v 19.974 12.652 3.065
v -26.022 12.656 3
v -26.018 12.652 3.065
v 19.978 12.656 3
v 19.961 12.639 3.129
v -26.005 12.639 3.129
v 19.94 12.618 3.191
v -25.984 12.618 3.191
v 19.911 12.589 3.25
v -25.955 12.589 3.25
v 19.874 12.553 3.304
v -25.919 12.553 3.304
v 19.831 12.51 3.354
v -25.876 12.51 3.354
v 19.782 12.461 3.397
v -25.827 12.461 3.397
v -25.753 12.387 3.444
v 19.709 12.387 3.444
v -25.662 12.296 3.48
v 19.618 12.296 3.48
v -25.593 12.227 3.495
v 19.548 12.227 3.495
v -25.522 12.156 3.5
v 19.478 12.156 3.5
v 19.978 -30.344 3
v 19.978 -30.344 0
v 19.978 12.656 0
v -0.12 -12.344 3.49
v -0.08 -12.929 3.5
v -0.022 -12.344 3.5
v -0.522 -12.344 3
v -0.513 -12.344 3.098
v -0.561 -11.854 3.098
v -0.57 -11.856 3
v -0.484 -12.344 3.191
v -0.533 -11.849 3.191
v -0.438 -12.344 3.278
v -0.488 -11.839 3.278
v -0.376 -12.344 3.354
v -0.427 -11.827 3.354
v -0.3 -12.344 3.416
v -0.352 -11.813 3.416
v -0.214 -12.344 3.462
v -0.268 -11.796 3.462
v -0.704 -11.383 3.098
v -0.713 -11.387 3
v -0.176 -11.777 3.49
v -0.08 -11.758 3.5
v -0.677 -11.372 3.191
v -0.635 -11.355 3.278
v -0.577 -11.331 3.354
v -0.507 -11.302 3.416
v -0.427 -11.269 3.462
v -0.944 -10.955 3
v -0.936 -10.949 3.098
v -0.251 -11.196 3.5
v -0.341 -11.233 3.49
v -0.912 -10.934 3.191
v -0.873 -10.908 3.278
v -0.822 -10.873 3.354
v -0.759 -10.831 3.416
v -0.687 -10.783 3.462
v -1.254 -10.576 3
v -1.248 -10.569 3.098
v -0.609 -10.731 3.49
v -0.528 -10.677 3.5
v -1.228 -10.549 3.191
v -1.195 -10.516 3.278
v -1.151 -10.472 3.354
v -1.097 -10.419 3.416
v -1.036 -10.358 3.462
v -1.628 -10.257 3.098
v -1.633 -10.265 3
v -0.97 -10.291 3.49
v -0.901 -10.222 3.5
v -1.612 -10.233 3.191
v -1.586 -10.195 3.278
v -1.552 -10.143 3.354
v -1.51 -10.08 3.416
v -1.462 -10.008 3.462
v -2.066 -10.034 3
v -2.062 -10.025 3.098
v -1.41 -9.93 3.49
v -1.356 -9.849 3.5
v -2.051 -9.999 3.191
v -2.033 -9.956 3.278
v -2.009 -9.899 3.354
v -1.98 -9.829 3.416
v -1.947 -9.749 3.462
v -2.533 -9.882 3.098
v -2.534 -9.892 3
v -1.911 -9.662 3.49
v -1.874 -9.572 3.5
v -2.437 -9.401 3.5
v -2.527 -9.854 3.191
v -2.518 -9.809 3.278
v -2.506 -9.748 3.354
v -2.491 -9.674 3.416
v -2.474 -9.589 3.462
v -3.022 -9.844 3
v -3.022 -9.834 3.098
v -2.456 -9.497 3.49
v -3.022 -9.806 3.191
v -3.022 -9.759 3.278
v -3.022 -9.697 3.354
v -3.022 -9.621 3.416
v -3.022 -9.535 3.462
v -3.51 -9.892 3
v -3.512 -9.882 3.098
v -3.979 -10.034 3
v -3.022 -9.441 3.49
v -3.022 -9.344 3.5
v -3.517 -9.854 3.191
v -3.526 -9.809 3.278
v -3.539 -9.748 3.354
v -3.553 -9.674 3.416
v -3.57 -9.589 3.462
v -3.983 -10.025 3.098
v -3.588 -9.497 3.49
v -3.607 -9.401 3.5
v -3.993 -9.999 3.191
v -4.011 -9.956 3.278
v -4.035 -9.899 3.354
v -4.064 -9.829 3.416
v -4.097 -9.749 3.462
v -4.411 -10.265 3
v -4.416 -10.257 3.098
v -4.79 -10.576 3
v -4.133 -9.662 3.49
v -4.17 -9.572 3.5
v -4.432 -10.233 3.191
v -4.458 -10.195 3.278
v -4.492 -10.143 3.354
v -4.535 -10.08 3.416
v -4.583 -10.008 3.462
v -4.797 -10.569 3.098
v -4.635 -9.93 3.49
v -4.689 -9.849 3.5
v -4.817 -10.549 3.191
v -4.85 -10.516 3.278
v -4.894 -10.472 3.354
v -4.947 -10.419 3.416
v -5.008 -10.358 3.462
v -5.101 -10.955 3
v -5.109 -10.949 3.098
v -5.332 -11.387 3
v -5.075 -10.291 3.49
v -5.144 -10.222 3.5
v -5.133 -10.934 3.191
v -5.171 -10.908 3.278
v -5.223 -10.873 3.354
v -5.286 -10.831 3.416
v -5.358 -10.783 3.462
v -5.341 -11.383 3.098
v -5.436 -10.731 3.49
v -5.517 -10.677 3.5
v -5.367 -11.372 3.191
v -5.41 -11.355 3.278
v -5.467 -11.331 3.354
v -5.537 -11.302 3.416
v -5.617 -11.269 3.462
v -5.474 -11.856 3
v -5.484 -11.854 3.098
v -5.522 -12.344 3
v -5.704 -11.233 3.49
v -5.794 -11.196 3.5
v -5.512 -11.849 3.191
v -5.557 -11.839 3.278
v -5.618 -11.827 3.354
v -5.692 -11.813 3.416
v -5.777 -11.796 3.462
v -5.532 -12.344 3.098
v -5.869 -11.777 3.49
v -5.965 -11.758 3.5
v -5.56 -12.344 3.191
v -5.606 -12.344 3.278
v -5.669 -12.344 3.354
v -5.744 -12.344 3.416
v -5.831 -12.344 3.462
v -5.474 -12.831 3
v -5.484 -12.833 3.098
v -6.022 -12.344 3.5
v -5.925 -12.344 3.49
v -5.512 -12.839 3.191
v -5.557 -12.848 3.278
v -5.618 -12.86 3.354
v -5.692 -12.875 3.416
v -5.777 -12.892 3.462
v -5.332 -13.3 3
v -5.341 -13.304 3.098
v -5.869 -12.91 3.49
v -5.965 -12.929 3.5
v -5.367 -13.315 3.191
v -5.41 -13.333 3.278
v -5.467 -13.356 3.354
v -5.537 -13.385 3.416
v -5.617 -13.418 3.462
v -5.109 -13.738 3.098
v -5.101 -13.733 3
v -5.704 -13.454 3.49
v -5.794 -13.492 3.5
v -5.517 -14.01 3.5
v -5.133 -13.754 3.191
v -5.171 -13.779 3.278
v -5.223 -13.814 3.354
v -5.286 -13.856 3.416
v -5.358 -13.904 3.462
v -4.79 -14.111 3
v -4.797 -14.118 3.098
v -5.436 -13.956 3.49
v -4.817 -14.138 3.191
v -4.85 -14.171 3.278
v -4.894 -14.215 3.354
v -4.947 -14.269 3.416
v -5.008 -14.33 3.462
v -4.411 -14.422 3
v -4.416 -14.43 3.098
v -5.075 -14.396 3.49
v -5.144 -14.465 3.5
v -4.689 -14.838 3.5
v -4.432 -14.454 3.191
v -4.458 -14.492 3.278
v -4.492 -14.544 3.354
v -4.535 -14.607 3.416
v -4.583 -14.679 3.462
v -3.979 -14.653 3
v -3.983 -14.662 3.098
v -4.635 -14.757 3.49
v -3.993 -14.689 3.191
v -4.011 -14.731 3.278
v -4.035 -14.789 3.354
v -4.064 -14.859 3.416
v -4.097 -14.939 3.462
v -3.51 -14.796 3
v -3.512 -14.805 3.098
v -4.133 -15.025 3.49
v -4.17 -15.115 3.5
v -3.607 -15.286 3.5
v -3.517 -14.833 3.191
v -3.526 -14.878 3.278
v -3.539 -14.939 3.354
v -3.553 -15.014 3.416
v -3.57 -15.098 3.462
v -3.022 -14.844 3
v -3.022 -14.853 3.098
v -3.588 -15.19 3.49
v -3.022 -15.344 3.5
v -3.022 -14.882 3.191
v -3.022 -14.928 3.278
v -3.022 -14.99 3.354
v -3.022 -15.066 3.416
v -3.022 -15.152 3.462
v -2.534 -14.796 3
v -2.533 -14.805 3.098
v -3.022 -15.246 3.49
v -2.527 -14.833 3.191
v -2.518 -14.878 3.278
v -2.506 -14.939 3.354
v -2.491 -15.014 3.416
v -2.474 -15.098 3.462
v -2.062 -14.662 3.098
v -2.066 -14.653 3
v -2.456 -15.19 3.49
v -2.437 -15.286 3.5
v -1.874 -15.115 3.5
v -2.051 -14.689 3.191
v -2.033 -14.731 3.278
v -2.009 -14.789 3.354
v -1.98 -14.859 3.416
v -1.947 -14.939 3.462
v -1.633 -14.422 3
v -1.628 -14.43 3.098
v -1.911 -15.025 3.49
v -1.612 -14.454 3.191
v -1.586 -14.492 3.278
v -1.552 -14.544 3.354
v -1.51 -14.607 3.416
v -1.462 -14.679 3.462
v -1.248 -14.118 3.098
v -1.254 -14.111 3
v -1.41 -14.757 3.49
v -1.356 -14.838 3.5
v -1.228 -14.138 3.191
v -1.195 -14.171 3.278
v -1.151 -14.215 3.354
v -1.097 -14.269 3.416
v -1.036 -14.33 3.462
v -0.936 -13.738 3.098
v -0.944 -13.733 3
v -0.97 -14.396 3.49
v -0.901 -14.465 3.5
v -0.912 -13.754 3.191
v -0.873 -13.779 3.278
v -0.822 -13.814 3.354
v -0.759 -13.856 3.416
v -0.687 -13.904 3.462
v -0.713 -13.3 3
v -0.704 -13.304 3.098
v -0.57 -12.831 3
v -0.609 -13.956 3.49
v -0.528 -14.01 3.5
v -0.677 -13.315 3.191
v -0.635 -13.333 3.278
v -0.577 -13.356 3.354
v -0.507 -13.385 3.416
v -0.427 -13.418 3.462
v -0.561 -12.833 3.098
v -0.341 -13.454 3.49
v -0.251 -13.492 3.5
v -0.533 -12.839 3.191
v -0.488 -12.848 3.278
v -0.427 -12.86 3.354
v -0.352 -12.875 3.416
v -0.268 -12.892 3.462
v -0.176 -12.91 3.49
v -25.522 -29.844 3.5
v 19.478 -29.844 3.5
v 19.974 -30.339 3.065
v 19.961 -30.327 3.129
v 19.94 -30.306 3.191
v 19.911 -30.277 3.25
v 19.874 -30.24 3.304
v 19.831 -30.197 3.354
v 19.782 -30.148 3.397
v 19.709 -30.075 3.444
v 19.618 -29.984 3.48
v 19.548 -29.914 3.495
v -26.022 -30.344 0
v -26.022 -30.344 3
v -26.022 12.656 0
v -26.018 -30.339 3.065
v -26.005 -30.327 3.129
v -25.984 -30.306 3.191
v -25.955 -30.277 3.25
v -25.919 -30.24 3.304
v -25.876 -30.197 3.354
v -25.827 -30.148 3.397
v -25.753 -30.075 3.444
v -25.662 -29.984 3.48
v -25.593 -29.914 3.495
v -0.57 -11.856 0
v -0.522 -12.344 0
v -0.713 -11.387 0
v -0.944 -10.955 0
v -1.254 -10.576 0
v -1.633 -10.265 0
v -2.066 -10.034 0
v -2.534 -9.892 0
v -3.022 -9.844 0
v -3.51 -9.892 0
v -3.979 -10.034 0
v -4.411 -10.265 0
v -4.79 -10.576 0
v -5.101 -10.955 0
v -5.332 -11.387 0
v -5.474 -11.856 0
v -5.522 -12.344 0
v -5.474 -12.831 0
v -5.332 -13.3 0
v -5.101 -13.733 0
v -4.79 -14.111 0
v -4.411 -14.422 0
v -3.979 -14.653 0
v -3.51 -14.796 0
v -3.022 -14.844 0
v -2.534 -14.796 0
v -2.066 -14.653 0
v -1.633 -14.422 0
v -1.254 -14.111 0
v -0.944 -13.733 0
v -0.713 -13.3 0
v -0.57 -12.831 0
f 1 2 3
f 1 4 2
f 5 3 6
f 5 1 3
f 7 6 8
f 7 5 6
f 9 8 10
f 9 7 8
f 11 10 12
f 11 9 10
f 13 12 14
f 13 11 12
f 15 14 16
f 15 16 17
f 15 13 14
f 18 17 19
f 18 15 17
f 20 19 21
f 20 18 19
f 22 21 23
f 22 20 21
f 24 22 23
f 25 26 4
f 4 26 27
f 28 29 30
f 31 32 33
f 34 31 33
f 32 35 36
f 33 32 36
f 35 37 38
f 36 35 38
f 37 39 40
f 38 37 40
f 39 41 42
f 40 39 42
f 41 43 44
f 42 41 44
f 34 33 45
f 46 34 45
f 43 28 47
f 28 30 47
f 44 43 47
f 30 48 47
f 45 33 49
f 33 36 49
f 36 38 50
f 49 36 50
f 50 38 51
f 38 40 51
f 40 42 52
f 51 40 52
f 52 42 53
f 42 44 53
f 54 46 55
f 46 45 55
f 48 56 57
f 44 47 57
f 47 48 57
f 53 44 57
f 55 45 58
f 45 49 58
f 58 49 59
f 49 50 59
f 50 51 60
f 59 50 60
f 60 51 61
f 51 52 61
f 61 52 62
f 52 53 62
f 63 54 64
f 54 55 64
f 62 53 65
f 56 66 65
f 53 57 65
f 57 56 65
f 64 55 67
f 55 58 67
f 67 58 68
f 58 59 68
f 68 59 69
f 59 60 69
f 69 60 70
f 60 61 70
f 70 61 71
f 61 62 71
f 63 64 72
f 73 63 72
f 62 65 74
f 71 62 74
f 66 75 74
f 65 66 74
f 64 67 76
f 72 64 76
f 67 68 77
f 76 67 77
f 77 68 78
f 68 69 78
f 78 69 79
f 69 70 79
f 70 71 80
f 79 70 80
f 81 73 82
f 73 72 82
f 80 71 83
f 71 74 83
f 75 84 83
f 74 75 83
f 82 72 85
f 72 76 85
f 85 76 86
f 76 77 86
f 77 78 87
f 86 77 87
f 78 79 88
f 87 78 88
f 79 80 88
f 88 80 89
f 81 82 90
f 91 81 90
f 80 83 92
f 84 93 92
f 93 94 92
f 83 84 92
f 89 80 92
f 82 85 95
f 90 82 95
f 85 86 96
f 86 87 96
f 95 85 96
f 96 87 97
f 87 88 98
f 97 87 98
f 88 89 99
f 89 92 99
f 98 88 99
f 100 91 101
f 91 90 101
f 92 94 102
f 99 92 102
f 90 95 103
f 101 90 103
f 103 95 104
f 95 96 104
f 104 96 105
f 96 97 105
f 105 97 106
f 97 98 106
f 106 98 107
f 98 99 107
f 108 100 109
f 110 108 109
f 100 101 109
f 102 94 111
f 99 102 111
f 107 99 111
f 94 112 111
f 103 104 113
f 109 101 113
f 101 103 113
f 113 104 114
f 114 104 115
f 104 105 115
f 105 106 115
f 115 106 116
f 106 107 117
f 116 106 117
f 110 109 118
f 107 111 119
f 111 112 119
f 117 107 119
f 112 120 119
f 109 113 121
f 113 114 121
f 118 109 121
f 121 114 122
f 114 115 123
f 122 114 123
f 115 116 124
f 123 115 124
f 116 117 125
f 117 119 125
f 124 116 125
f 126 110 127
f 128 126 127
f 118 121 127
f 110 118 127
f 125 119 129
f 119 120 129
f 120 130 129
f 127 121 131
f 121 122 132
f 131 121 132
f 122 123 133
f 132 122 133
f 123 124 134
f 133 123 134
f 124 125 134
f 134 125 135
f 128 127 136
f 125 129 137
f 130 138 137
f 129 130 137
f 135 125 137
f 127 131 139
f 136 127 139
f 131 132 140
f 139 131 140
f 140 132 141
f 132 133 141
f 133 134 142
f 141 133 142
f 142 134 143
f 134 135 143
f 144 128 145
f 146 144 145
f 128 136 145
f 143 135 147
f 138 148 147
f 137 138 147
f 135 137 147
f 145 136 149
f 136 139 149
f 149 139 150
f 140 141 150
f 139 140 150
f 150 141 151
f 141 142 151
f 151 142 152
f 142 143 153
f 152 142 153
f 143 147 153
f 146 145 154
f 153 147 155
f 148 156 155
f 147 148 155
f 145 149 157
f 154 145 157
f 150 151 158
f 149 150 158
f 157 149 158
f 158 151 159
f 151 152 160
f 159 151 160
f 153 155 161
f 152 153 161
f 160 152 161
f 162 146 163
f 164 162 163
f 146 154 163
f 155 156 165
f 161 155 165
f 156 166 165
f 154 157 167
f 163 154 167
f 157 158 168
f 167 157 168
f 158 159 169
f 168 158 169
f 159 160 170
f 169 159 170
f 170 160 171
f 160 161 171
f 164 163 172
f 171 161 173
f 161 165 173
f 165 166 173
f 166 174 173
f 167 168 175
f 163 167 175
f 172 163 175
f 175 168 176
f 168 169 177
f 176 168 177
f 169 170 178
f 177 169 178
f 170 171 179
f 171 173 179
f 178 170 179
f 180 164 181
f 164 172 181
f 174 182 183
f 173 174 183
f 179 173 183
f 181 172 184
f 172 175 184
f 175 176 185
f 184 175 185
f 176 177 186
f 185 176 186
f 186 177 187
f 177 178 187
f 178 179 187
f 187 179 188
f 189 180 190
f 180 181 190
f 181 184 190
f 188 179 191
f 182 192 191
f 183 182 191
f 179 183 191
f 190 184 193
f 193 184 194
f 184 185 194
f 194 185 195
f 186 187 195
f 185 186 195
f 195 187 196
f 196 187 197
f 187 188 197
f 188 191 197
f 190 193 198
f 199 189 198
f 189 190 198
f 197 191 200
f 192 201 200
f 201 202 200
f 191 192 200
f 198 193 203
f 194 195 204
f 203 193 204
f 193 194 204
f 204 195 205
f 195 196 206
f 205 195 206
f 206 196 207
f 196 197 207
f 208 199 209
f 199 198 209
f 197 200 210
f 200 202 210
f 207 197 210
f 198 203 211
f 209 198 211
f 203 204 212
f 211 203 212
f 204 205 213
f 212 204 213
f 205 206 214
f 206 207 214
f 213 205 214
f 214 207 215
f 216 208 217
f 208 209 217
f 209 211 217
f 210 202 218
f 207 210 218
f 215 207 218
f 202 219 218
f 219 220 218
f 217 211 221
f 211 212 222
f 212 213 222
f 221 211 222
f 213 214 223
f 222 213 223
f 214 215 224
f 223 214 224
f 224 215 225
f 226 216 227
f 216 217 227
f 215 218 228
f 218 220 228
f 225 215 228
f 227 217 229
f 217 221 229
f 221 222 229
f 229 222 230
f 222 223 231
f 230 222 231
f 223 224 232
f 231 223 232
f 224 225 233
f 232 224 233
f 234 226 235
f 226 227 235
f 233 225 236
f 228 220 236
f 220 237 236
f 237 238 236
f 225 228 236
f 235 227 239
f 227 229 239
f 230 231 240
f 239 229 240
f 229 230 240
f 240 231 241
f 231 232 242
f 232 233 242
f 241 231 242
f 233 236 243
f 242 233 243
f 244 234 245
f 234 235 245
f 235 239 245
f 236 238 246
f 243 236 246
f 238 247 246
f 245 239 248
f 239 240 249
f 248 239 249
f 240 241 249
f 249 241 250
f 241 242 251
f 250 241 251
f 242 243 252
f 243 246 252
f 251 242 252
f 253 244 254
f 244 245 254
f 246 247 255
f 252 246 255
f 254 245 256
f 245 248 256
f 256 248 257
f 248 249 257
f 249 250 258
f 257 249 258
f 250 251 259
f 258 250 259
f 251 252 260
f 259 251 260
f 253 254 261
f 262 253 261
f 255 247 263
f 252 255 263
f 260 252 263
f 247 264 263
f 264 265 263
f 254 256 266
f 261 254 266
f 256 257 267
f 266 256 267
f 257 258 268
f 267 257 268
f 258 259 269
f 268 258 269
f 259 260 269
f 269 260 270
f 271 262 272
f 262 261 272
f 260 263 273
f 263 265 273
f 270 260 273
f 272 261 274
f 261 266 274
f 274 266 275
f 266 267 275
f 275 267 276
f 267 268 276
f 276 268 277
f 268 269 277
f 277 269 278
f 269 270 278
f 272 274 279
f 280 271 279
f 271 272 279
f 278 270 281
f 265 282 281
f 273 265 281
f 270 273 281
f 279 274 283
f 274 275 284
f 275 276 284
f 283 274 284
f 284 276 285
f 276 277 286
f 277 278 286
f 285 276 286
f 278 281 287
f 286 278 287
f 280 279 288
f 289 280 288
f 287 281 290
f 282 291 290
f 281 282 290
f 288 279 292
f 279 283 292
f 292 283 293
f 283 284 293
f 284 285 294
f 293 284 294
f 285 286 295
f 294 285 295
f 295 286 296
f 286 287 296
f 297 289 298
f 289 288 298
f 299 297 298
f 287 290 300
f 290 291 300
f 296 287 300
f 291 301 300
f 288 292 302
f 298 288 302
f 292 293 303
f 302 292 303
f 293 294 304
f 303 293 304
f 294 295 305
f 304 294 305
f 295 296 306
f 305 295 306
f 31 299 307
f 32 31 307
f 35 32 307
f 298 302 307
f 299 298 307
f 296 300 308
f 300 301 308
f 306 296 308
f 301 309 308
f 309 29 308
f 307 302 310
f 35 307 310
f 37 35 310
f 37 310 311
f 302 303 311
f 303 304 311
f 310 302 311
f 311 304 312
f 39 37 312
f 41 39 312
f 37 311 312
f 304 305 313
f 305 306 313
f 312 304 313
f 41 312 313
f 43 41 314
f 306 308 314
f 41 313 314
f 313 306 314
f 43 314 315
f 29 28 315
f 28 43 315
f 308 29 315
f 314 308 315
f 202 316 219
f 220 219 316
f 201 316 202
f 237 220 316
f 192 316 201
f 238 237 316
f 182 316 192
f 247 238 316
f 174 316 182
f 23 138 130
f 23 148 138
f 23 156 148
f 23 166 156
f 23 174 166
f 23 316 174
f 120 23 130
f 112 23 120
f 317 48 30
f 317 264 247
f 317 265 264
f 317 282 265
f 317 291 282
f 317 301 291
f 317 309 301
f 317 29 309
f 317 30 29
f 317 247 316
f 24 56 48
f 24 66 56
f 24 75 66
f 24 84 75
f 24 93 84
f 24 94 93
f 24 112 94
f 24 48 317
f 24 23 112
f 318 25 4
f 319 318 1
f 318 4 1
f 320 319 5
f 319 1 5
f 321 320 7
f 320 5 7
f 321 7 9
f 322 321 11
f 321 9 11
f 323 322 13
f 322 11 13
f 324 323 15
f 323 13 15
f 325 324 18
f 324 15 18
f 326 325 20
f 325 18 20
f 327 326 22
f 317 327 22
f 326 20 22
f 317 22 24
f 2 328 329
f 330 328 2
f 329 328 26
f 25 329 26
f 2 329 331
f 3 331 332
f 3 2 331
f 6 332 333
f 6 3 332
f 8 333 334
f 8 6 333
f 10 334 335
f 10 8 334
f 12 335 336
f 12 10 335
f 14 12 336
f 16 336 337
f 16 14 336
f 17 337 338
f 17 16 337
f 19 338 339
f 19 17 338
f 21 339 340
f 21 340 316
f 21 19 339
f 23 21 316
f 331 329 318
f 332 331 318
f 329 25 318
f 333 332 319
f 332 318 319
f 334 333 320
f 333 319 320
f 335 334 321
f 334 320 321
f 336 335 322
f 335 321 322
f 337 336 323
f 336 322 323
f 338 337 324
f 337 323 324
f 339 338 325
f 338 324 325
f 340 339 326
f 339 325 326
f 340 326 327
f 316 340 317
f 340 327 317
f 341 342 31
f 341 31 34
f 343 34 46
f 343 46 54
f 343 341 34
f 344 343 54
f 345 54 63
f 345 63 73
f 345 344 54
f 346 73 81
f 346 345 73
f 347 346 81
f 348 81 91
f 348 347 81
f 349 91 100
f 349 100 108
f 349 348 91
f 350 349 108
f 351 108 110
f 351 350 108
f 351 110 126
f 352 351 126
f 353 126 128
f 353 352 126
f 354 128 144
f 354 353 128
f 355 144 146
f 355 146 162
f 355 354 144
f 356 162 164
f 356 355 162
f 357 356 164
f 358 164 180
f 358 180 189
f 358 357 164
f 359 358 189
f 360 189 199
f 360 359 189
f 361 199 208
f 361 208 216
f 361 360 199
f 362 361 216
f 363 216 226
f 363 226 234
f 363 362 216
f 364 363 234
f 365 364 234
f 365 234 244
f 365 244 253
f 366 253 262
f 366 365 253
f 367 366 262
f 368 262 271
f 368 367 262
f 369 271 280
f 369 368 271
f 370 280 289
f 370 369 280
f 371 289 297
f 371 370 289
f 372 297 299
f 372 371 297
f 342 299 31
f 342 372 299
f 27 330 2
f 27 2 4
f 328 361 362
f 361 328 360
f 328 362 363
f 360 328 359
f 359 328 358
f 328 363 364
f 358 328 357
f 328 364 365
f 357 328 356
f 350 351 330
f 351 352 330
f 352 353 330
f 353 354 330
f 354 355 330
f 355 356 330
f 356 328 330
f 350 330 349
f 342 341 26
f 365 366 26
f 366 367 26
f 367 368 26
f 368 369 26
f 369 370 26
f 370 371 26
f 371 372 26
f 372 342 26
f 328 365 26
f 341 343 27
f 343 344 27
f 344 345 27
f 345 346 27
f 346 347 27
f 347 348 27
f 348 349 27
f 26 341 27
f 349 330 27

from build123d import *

# Parameters (mm, degrees)
F0_W     = 46
F0_H     = 43
F0_R     = 2.5
F1_DEPTH = 3.5
F2_R     = 0.5


with BuildPart() as f1:
    # F0 (on Top) → F1 (new body)
    with BuildSketch(Plane.XY):
        with Locations((-3.022213, -8.843659)):
            Rectangle(F0_W, F0_H)
        with Locations((-3.022213, -12.343659)):
            Circle(F0_R, mode=Mode.SUBTRACT)
    extrude(amount=F1_DEPTH)

    # F2
    f2_edges = [f1.edges().sort_by_distance(p)[0] for p in [
        (-3.022213, 12.656341, 3.5),
        (-26.022213, -8.843659, 3.5),
        (-3.022213, -30.343659, 3.5),
        (19.977787, -8.843659, 3.5),
        (-5.522213, -12.343659, 3.5),
    ]]
    fillet(f2_edges, radius=F2_R)


solid = f1.part
